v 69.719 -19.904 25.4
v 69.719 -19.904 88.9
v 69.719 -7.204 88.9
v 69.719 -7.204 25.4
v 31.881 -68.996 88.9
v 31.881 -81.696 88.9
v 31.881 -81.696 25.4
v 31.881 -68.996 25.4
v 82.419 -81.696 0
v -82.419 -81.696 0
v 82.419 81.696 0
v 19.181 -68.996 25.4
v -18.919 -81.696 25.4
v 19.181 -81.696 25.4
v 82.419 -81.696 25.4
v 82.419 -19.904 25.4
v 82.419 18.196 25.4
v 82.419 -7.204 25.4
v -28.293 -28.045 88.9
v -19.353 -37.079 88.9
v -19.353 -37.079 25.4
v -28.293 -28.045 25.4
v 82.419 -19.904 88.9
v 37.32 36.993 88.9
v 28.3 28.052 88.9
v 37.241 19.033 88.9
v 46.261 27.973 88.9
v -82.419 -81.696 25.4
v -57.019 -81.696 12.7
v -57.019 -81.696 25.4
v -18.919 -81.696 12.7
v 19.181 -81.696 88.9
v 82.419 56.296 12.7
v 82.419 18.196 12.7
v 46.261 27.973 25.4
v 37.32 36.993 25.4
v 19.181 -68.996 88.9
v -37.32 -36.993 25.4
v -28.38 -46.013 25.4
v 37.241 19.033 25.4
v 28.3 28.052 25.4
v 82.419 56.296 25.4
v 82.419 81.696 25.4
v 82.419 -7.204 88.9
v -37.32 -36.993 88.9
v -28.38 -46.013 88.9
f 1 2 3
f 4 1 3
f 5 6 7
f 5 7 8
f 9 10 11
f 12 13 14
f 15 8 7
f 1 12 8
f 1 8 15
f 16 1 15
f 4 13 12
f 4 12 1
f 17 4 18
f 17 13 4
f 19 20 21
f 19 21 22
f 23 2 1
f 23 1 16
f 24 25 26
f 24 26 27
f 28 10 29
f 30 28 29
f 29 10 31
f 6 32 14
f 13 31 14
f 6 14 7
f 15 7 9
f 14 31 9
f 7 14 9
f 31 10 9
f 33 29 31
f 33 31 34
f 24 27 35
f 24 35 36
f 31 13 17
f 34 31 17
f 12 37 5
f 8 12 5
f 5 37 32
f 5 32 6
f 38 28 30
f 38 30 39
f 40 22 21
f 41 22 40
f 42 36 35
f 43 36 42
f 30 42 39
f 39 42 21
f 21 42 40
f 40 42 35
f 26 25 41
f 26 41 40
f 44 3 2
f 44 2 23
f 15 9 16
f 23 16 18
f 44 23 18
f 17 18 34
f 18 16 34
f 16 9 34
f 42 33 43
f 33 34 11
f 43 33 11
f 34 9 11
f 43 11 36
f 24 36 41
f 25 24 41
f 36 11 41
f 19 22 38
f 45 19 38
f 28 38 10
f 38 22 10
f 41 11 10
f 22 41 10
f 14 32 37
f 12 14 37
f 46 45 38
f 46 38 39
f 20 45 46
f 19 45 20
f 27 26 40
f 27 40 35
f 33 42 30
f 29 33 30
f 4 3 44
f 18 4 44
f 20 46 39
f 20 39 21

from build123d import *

# Parameters (mm, degrees)
F1_DEPTH = 25.4
F2_W     = 12.7
F2_H     = 12.7
F3_DEPTH = 63.5
F4_DEPTH = 76.2
F6_DEPTH = 12.7


with BuildPart() as f1:
    # F0 (on Top) → F1 (new body)
    with BuildSketch(Plane.XY):
        Polygon((-82.4187099934, -81.6961601377), (82.4187099934, -81.6961601377), (82.4187099934, 81.6961601377), align=None)
    extrude(amount=F1_DEPTH)

    # F2 (on face) → F3 (join)
    with BuildSketch(Plane.XY.offset(25.4)):
        Polygon((37.3201792488, 36.9930000181), (28.3004730998, 28.0523679941), (37.2411051238, 19.0326618452), (46.2608112727, 27.9732938691), align=None)
        Polygon((82.4187099934, 56.2961601377), (-57.0187099934, -81.6961601377), (-31.6187099934, -81.6961601377), (-18.9187099934, -81.6961601377), (82.4187099934, 18.1961601377), (82.4187099934, 30.8961601377), (82.4187099934, 43.5961601377), align=None)
        with Locations((76.0687099934, -13.5538398623)):
            Rectangle(F2_W, F2_H)
        with Locations((25.5312900066, -75.3461601377)):
            Rectangle(F2_W, F2_H)
        Polygon((-28.293198853, -28.0451575193), (-37.3201792488, -36.9930000181), (-28.3795472248, -46.012706167), (-19.3526364396, -37.0793483618), align=None)
    extrude(amount=F3_DEPTH)

    # F4 (cut): a face of the model
    f4_faces = [f1.faces().sort_by_distance(p)[0] for p in [
        (21.8407092905, -21.5998593386, 88.9),
    ]]
    extrude(f4_faces, amount=-F4_DEPTH, mode=Mode.SUBTRACT)

    # F5 (on face) → F6 (join)
    with BuildSketch(Plane.XY.offset(25.4)):
        Polygon((82.4187099934, 18.1961601377), (-18.9187099934, -81.6961601377), (-8.7587099934, -81.6961601377), (82.4187099934, 8.1810445552), align=None)
    extrude(amount=-F6_DEPTH)


solid = f1.part
